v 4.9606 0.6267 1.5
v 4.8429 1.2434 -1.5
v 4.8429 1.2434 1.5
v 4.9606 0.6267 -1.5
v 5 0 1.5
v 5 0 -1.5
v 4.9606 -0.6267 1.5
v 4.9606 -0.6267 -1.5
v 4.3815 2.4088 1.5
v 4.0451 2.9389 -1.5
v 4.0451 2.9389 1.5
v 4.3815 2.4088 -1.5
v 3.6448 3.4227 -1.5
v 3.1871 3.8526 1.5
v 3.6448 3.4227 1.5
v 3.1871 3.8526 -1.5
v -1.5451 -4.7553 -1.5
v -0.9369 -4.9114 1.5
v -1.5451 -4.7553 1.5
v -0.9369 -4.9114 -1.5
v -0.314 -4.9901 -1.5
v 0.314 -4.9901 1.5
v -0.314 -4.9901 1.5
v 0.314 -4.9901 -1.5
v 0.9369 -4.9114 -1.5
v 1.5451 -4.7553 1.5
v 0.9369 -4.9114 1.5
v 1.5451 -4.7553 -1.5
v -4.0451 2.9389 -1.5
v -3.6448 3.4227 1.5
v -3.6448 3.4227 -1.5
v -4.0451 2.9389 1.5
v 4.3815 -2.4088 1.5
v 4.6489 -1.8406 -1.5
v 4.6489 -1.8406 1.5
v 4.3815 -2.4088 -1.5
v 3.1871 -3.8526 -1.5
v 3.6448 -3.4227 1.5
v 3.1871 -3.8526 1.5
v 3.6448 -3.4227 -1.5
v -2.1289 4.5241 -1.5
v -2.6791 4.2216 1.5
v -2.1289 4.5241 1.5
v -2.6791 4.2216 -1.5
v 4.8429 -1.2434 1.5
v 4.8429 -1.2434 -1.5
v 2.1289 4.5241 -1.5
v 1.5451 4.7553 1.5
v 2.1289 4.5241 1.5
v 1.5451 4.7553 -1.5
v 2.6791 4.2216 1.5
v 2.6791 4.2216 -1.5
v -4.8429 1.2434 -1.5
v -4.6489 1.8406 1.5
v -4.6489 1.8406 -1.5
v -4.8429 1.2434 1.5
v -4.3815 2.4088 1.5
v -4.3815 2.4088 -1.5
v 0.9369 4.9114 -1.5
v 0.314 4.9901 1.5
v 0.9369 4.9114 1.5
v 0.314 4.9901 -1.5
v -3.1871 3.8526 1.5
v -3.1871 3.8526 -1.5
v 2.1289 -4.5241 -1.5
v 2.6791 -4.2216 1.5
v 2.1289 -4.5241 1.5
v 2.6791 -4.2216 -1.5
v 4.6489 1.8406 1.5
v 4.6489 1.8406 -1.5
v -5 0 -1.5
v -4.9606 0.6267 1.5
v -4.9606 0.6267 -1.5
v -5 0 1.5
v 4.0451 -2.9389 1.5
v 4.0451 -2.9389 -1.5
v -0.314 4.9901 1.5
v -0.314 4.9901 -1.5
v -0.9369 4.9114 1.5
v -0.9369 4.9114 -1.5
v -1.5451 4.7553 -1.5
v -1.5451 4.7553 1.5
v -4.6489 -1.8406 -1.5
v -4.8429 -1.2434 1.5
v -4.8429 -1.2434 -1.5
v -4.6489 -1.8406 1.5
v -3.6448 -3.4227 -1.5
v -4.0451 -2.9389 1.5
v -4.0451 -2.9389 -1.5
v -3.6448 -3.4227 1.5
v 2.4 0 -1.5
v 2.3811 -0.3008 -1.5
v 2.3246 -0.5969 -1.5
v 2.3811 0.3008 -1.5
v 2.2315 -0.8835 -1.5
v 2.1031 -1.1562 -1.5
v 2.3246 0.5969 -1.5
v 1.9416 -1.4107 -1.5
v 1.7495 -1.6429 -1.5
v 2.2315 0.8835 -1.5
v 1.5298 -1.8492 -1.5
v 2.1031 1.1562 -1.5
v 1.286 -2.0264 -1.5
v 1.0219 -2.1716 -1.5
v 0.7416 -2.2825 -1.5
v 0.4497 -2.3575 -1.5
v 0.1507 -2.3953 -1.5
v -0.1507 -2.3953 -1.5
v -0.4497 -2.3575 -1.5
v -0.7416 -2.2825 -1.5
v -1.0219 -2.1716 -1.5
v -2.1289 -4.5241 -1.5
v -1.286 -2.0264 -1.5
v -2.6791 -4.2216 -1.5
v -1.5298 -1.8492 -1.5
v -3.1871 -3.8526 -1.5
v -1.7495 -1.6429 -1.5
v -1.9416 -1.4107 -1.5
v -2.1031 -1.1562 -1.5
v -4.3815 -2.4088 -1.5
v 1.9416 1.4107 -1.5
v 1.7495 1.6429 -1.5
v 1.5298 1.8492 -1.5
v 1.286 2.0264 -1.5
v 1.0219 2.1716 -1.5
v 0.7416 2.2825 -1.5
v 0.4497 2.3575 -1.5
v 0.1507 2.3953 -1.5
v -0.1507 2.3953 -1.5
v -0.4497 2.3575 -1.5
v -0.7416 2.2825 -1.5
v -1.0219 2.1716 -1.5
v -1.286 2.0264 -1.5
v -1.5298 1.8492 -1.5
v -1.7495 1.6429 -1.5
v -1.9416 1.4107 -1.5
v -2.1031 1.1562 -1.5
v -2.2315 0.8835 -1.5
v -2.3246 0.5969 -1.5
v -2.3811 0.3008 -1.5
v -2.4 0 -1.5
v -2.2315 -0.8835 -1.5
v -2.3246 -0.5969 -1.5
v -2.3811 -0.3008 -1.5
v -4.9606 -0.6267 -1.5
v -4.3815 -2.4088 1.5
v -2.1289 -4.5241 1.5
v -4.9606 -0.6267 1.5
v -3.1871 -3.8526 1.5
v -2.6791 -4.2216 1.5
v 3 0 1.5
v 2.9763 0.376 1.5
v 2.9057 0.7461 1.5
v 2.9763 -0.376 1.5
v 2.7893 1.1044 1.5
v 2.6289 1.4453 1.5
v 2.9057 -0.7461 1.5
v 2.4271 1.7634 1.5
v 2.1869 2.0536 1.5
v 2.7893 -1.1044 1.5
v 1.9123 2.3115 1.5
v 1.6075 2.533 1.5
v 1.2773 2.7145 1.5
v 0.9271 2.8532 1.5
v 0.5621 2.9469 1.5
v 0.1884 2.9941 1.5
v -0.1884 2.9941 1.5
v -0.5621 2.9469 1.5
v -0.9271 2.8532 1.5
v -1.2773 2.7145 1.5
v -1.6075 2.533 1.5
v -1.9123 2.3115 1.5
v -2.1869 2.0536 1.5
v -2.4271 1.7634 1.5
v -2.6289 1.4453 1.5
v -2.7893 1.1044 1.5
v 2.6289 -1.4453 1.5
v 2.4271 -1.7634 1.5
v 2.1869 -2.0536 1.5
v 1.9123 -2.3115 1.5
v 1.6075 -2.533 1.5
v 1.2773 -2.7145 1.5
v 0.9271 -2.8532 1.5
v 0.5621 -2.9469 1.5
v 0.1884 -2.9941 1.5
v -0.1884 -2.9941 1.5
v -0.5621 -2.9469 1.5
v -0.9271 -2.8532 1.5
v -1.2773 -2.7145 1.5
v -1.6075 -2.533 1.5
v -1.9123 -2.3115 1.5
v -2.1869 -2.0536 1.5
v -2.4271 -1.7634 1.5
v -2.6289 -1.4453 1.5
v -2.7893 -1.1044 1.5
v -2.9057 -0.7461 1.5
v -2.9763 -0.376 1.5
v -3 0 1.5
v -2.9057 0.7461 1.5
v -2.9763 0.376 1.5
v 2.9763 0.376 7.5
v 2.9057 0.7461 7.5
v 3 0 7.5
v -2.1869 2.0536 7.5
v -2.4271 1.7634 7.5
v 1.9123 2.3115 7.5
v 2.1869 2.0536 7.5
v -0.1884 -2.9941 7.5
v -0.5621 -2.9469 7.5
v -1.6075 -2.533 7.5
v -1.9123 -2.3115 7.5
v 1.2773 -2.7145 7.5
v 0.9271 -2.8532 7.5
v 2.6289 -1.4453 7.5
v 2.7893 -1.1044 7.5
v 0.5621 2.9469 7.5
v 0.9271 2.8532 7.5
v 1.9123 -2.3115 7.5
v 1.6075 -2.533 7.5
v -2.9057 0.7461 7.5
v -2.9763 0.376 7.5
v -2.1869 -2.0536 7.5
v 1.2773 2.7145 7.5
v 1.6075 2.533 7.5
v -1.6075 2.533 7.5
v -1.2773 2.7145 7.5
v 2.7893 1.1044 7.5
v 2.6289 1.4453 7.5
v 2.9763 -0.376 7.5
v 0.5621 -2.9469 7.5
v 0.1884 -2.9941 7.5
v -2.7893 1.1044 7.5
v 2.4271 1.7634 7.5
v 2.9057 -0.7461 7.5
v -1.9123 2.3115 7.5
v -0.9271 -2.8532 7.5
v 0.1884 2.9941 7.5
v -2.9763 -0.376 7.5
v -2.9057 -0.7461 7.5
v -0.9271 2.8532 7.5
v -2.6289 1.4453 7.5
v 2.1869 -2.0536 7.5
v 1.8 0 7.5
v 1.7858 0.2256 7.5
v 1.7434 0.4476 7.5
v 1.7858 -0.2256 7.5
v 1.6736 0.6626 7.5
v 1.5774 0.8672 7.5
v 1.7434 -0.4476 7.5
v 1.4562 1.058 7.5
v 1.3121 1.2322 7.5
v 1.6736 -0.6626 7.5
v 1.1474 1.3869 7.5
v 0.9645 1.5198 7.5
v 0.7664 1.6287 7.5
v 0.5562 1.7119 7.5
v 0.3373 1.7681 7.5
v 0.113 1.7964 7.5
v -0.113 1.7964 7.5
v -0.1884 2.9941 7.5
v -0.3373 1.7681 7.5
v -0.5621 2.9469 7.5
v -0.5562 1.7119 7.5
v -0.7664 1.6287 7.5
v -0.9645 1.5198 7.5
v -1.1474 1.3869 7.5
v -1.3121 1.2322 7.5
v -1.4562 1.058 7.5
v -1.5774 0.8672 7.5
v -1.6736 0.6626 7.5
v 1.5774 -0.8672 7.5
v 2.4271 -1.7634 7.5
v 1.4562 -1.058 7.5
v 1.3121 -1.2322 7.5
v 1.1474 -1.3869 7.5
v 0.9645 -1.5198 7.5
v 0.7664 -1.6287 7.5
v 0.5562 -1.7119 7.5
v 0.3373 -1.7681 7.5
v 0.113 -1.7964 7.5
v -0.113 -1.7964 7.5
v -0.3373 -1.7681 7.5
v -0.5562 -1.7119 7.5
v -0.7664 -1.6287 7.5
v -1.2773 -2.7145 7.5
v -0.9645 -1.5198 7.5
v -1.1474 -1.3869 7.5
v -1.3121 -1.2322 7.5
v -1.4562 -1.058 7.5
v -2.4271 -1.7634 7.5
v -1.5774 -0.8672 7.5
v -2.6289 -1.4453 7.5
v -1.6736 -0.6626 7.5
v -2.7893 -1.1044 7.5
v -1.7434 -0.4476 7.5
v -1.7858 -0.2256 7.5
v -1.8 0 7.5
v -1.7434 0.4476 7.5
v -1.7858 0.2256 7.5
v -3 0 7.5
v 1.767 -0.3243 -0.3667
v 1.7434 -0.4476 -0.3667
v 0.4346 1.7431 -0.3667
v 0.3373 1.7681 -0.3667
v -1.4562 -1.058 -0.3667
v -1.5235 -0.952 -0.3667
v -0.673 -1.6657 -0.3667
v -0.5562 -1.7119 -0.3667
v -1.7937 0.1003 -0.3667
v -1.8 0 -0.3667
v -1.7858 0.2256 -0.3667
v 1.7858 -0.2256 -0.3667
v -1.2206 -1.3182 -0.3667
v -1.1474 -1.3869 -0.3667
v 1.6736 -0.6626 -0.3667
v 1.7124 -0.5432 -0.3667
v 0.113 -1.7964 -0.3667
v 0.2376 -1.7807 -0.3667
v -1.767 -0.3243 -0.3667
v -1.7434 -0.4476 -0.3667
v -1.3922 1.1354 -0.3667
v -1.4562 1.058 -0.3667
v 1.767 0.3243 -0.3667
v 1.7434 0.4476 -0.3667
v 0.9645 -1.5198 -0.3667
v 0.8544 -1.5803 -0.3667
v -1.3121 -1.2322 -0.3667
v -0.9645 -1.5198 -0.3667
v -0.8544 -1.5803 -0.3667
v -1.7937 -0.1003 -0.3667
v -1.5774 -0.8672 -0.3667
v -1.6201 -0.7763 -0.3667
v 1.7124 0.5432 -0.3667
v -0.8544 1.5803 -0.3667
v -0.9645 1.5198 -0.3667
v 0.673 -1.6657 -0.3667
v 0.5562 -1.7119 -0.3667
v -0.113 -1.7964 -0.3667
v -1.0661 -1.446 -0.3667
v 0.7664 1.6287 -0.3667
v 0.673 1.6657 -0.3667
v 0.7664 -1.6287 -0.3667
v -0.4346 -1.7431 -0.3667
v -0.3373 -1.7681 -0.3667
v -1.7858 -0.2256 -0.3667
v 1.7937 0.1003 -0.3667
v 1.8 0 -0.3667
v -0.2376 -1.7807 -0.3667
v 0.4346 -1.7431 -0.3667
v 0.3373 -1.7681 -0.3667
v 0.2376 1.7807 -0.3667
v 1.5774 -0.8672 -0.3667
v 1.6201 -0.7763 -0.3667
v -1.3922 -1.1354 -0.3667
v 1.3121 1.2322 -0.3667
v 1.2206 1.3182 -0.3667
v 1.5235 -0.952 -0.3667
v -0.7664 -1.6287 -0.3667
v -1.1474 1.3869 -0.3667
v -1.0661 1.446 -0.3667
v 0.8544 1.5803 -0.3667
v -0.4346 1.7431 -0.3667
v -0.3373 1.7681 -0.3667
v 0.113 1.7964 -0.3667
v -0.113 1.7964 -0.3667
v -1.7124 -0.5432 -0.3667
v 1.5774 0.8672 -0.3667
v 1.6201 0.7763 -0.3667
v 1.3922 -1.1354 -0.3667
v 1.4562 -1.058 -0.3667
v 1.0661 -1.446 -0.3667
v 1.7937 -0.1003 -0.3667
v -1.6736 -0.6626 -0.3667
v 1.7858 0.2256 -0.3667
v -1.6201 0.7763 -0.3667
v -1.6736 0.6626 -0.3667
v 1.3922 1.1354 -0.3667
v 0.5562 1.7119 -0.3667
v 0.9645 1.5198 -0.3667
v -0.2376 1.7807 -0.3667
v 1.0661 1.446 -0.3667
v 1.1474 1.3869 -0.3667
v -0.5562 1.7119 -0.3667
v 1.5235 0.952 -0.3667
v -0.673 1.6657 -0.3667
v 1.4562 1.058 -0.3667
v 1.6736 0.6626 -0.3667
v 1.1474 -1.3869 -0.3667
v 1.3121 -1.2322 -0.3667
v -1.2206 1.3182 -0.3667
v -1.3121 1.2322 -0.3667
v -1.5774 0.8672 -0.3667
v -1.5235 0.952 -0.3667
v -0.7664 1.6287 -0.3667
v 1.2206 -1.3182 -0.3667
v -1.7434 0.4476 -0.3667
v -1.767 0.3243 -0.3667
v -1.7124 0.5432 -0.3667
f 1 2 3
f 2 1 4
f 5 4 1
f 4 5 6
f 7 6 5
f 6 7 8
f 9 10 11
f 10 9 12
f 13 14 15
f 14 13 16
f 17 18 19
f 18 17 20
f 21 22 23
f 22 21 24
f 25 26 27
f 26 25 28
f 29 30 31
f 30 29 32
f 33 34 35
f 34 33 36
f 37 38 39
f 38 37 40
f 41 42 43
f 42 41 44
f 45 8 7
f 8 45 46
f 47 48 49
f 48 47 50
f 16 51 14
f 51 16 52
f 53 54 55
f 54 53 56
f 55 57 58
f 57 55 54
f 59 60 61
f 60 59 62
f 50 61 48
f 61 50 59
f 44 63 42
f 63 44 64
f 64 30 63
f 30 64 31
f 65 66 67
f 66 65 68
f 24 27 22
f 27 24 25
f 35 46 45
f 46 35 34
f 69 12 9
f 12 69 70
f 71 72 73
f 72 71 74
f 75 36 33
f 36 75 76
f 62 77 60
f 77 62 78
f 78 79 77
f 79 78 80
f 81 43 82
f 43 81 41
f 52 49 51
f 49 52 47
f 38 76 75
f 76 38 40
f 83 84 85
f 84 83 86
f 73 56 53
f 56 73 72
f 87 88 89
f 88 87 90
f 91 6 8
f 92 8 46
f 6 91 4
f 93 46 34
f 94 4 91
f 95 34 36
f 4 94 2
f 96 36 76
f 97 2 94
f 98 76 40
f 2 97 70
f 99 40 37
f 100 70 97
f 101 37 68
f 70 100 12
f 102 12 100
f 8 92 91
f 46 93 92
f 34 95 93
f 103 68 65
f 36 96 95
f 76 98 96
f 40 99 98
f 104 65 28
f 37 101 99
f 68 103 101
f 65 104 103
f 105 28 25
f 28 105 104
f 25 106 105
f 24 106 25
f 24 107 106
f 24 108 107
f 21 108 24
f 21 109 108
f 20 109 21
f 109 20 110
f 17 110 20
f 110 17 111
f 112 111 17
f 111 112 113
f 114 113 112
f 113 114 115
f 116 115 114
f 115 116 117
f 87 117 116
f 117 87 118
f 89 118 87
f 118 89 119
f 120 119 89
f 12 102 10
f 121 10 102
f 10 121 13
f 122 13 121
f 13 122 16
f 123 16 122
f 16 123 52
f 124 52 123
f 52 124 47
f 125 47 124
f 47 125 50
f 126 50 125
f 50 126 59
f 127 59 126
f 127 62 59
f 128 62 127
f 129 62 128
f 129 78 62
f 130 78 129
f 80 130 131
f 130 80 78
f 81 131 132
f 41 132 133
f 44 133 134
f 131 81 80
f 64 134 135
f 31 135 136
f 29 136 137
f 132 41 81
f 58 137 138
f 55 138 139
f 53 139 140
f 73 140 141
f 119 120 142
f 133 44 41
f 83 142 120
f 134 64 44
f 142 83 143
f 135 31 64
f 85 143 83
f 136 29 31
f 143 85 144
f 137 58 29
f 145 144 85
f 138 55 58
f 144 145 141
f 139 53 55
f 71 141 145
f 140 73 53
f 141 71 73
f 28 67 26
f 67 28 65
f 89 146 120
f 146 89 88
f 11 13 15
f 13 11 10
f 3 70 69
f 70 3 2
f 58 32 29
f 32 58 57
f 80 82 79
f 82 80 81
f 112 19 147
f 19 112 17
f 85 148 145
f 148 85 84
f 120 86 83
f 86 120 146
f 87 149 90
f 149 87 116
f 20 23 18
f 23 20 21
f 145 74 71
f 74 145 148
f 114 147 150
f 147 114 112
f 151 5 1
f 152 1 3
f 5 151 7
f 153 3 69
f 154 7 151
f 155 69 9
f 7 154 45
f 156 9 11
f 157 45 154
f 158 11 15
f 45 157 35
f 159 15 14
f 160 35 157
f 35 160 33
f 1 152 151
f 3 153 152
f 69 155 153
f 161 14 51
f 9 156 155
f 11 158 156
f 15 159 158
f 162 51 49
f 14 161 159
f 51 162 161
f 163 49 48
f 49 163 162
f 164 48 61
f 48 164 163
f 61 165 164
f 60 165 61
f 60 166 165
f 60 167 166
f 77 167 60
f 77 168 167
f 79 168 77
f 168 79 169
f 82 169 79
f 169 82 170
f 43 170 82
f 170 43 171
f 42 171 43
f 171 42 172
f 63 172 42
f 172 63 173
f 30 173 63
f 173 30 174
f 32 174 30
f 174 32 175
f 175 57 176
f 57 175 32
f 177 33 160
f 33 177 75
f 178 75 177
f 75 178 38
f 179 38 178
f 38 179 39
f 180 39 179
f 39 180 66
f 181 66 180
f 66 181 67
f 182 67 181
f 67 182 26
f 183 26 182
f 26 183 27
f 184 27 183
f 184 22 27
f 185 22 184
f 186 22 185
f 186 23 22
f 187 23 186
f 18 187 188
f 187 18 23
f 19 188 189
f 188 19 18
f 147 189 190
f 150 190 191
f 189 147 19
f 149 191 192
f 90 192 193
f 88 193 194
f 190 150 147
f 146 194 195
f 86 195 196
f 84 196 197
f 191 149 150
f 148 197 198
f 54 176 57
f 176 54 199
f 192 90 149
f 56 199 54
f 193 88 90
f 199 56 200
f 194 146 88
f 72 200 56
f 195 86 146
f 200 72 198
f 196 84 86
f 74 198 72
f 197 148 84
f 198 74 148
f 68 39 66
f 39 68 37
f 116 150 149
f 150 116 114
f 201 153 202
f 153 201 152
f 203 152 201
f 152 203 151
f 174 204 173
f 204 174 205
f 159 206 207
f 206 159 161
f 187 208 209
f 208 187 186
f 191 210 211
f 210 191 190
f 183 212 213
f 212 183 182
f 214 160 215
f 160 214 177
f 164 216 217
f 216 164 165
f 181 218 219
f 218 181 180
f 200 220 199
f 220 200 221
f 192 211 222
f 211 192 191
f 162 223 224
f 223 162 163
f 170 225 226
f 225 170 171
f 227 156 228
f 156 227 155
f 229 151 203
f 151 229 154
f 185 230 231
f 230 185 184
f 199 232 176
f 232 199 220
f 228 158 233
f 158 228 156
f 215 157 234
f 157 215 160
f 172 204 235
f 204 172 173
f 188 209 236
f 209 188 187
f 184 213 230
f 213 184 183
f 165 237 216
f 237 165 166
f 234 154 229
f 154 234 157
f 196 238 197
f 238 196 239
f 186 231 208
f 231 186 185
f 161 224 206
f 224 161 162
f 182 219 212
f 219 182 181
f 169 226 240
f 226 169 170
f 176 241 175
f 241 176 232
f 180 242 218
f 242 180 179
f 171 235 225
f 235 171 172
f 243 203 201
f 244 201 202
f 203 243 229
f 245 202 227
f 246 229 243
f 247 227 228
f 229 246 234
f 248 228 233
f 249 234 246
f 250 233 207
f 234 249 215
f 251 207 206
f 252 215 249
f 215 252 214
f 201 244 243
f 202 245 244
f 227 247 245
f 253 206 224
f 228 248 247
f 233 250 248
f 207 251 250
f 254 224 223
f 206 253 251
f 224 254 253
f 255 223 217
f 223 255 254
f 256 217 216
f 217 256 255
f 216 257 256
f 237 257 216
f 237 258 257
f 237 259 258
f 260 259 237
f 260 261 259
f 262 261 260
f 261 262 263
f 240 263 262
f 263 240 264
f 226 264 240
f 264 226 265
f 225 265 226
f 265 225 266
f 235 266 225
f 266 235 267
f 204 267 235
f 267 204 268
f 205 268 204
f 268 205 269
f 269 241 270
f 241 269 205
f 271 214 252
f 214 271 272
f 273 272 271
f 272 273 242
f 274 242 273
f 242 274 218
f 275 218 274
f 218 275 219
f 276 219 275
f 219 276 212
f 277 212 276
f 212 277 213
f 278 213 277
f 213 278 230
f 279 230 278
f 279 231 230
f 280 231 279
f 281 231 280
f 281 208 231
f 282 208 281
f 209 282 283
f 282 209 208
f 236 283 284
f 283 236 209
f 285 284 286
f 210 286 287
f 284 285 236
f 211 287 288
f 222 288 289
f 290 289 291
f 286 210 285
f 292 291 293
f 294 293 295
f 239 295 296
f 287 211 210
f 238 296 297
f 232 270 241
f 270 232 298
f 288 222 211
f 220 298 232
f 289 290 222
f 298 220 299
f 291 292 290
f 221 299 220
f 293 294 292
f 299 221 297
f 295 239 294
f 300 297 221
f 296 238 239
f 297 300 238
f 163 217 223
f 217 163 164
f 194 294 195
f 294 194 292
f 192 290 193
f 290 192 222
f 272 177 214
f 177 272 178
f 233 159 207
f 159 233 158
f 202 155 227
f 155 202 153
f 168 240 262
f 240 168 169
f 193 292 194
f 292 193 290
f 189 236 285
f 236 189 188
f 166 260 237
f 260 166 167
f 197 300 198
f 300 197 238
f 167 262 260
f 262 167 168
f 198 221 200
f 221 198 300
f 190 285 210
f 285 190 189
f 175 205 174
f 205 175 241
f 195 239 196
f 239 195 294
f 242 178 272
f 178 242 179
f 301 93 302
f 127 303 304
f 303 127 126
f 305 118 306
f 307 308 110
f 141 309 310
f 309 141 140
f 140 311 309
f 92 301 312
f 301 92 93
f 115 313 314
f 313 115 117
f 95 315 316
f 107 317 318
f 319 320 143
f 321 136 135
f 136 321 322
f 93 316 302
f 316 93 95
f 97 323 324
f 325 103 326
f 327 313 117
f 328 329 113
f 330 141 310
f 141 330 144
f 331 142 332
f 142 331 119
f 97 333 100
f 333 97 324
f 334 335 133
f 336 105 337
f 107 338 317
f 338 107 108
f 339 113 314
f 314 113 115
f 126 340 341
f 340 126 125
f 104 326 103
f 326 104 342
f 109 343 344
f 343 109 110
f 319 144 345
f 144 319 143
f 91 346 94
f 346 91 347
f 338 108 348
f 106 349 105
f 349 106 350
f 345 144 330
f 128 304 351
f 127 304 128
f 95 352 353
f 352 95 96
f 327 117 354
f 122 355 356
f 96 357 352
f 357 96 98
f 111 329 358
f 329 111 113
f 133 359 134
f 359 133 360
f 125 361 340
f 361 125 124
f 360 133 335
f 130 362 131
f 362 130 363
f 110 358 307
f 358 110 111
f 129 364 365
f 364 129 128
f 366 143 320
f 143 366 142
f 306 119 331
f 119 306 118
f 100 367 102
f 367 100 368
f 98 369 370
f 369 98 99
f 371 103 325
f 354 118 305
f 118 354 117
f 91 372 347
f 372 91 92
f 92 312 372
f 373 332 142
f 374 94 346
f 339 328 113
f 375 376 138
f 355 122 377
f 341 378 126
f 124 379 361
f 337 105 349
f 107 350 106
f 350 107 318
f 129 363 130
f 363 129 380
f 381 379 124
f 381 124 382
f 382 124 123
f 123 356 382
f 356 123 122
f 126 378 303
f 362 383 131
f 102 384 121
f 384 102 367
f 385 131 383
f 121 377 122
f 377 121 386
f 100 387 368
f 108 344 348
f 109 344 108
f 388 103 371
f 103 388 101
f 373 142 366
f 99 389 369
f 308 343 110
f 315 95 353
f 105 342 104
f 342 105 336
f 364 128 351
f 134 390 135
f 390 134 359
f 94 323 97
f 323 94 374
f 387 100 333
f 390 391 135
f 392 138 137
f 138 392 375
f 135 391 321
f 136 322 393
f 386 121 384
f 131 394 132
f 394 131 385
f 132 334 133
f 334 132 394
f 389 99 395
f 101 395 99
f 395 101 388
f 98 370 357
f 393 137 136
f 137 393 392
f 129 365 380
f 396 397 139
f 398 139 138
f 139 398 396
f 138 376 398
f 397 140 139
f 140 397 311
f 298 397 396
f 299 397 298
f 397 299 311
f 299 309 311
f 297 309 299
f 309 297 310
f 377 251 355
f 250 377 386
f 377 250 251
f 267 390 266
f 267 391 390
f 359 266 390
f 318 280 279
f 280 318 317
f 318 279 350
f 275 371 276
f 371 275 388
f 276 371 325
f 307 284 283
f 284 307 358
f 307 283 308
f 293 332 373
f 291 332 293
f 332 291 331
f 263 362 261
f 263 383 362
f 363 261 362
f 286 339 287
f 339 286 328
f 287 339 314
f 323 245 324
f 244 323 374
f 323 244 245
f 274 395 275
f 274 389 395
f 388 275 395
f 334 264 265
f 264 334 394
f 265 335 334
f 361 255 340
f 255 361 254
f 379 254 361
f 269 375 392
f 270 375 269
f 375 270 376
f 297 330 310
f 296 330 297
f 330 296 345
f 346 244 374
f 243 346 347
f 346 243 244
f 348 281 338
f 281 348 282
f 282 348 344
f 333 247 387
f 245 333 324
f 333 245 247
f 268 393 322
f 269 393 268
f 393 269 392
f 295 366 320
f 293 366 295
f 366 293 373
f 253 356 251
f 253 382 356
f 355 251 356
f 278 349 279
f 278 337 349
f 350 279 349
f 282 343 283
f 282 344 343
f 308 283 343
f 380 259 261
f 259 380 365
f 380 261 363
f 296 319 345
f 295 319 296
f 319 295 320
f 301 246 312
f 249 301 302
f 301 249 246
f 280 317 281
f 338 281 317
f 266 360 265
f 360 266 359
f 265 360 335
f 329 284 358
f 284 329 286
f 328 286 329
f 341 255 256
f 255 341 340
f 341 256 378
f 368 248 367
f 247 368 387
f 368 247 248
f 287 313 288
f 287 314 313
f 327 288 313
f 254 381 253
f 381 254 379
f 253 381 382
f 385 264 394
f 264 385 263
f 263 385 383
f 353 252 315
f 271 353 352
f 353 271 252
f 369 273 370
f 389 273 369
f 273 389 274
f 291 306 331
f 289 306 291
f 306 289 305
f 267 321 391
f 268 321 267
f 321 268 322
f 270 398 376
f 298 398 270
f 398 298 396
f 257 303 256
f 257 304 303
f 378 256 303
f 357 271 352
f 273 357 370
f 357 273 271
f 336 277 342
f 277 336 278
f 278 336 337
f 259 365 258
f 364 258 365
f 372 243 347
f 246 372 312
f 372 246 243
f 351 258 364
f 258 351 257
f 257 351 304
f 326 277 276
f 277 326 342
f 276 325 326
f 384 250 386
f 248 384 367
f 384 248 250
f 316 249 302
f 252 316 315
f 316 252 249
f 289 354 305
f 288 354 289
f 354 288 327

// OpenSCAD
$fn = 50;


difference() {
	union() {
		translate(v = [0, 0, -1.5000000000]) {
			cylinder(h = 3, r = 5.0000000000);
		}
		translate(v = [0, 0, -1.5000000000]) {
			cylinder(h = 9, r = 3.0000000000);
		}
	}
	union() {
		translate(v = [0, 0, -1.5000000000]) {
			rotate(a = [0, 180, 0]) {
				difference() {
					union() {
						translate(v = [0, 0, -1.7000000000]) {
							cylinder(h = 1.7000000000, r1 = 1.5000000000, r2 = 2.4000000000);
						}
						translate(v = [0, 0, -9.0000000000]) {
							cylinder(h = 9, r = 1.5000000000);
						}
						translate(v = [0, 0, -9.0000000000]) {
							cylinder(h = 9, r = 1.8000000000);
						}
						translate(v = [0, 0, -9.0000000000]) {
							cylinder(h = 9, r = 1.5000000000);
						}
					}
					union();
				}
			}
		}
		translate(v = [0, 0, -100.0000000000]) {
			cylinder(h = 200, r = 1.5000000000);
		}
	}
}
